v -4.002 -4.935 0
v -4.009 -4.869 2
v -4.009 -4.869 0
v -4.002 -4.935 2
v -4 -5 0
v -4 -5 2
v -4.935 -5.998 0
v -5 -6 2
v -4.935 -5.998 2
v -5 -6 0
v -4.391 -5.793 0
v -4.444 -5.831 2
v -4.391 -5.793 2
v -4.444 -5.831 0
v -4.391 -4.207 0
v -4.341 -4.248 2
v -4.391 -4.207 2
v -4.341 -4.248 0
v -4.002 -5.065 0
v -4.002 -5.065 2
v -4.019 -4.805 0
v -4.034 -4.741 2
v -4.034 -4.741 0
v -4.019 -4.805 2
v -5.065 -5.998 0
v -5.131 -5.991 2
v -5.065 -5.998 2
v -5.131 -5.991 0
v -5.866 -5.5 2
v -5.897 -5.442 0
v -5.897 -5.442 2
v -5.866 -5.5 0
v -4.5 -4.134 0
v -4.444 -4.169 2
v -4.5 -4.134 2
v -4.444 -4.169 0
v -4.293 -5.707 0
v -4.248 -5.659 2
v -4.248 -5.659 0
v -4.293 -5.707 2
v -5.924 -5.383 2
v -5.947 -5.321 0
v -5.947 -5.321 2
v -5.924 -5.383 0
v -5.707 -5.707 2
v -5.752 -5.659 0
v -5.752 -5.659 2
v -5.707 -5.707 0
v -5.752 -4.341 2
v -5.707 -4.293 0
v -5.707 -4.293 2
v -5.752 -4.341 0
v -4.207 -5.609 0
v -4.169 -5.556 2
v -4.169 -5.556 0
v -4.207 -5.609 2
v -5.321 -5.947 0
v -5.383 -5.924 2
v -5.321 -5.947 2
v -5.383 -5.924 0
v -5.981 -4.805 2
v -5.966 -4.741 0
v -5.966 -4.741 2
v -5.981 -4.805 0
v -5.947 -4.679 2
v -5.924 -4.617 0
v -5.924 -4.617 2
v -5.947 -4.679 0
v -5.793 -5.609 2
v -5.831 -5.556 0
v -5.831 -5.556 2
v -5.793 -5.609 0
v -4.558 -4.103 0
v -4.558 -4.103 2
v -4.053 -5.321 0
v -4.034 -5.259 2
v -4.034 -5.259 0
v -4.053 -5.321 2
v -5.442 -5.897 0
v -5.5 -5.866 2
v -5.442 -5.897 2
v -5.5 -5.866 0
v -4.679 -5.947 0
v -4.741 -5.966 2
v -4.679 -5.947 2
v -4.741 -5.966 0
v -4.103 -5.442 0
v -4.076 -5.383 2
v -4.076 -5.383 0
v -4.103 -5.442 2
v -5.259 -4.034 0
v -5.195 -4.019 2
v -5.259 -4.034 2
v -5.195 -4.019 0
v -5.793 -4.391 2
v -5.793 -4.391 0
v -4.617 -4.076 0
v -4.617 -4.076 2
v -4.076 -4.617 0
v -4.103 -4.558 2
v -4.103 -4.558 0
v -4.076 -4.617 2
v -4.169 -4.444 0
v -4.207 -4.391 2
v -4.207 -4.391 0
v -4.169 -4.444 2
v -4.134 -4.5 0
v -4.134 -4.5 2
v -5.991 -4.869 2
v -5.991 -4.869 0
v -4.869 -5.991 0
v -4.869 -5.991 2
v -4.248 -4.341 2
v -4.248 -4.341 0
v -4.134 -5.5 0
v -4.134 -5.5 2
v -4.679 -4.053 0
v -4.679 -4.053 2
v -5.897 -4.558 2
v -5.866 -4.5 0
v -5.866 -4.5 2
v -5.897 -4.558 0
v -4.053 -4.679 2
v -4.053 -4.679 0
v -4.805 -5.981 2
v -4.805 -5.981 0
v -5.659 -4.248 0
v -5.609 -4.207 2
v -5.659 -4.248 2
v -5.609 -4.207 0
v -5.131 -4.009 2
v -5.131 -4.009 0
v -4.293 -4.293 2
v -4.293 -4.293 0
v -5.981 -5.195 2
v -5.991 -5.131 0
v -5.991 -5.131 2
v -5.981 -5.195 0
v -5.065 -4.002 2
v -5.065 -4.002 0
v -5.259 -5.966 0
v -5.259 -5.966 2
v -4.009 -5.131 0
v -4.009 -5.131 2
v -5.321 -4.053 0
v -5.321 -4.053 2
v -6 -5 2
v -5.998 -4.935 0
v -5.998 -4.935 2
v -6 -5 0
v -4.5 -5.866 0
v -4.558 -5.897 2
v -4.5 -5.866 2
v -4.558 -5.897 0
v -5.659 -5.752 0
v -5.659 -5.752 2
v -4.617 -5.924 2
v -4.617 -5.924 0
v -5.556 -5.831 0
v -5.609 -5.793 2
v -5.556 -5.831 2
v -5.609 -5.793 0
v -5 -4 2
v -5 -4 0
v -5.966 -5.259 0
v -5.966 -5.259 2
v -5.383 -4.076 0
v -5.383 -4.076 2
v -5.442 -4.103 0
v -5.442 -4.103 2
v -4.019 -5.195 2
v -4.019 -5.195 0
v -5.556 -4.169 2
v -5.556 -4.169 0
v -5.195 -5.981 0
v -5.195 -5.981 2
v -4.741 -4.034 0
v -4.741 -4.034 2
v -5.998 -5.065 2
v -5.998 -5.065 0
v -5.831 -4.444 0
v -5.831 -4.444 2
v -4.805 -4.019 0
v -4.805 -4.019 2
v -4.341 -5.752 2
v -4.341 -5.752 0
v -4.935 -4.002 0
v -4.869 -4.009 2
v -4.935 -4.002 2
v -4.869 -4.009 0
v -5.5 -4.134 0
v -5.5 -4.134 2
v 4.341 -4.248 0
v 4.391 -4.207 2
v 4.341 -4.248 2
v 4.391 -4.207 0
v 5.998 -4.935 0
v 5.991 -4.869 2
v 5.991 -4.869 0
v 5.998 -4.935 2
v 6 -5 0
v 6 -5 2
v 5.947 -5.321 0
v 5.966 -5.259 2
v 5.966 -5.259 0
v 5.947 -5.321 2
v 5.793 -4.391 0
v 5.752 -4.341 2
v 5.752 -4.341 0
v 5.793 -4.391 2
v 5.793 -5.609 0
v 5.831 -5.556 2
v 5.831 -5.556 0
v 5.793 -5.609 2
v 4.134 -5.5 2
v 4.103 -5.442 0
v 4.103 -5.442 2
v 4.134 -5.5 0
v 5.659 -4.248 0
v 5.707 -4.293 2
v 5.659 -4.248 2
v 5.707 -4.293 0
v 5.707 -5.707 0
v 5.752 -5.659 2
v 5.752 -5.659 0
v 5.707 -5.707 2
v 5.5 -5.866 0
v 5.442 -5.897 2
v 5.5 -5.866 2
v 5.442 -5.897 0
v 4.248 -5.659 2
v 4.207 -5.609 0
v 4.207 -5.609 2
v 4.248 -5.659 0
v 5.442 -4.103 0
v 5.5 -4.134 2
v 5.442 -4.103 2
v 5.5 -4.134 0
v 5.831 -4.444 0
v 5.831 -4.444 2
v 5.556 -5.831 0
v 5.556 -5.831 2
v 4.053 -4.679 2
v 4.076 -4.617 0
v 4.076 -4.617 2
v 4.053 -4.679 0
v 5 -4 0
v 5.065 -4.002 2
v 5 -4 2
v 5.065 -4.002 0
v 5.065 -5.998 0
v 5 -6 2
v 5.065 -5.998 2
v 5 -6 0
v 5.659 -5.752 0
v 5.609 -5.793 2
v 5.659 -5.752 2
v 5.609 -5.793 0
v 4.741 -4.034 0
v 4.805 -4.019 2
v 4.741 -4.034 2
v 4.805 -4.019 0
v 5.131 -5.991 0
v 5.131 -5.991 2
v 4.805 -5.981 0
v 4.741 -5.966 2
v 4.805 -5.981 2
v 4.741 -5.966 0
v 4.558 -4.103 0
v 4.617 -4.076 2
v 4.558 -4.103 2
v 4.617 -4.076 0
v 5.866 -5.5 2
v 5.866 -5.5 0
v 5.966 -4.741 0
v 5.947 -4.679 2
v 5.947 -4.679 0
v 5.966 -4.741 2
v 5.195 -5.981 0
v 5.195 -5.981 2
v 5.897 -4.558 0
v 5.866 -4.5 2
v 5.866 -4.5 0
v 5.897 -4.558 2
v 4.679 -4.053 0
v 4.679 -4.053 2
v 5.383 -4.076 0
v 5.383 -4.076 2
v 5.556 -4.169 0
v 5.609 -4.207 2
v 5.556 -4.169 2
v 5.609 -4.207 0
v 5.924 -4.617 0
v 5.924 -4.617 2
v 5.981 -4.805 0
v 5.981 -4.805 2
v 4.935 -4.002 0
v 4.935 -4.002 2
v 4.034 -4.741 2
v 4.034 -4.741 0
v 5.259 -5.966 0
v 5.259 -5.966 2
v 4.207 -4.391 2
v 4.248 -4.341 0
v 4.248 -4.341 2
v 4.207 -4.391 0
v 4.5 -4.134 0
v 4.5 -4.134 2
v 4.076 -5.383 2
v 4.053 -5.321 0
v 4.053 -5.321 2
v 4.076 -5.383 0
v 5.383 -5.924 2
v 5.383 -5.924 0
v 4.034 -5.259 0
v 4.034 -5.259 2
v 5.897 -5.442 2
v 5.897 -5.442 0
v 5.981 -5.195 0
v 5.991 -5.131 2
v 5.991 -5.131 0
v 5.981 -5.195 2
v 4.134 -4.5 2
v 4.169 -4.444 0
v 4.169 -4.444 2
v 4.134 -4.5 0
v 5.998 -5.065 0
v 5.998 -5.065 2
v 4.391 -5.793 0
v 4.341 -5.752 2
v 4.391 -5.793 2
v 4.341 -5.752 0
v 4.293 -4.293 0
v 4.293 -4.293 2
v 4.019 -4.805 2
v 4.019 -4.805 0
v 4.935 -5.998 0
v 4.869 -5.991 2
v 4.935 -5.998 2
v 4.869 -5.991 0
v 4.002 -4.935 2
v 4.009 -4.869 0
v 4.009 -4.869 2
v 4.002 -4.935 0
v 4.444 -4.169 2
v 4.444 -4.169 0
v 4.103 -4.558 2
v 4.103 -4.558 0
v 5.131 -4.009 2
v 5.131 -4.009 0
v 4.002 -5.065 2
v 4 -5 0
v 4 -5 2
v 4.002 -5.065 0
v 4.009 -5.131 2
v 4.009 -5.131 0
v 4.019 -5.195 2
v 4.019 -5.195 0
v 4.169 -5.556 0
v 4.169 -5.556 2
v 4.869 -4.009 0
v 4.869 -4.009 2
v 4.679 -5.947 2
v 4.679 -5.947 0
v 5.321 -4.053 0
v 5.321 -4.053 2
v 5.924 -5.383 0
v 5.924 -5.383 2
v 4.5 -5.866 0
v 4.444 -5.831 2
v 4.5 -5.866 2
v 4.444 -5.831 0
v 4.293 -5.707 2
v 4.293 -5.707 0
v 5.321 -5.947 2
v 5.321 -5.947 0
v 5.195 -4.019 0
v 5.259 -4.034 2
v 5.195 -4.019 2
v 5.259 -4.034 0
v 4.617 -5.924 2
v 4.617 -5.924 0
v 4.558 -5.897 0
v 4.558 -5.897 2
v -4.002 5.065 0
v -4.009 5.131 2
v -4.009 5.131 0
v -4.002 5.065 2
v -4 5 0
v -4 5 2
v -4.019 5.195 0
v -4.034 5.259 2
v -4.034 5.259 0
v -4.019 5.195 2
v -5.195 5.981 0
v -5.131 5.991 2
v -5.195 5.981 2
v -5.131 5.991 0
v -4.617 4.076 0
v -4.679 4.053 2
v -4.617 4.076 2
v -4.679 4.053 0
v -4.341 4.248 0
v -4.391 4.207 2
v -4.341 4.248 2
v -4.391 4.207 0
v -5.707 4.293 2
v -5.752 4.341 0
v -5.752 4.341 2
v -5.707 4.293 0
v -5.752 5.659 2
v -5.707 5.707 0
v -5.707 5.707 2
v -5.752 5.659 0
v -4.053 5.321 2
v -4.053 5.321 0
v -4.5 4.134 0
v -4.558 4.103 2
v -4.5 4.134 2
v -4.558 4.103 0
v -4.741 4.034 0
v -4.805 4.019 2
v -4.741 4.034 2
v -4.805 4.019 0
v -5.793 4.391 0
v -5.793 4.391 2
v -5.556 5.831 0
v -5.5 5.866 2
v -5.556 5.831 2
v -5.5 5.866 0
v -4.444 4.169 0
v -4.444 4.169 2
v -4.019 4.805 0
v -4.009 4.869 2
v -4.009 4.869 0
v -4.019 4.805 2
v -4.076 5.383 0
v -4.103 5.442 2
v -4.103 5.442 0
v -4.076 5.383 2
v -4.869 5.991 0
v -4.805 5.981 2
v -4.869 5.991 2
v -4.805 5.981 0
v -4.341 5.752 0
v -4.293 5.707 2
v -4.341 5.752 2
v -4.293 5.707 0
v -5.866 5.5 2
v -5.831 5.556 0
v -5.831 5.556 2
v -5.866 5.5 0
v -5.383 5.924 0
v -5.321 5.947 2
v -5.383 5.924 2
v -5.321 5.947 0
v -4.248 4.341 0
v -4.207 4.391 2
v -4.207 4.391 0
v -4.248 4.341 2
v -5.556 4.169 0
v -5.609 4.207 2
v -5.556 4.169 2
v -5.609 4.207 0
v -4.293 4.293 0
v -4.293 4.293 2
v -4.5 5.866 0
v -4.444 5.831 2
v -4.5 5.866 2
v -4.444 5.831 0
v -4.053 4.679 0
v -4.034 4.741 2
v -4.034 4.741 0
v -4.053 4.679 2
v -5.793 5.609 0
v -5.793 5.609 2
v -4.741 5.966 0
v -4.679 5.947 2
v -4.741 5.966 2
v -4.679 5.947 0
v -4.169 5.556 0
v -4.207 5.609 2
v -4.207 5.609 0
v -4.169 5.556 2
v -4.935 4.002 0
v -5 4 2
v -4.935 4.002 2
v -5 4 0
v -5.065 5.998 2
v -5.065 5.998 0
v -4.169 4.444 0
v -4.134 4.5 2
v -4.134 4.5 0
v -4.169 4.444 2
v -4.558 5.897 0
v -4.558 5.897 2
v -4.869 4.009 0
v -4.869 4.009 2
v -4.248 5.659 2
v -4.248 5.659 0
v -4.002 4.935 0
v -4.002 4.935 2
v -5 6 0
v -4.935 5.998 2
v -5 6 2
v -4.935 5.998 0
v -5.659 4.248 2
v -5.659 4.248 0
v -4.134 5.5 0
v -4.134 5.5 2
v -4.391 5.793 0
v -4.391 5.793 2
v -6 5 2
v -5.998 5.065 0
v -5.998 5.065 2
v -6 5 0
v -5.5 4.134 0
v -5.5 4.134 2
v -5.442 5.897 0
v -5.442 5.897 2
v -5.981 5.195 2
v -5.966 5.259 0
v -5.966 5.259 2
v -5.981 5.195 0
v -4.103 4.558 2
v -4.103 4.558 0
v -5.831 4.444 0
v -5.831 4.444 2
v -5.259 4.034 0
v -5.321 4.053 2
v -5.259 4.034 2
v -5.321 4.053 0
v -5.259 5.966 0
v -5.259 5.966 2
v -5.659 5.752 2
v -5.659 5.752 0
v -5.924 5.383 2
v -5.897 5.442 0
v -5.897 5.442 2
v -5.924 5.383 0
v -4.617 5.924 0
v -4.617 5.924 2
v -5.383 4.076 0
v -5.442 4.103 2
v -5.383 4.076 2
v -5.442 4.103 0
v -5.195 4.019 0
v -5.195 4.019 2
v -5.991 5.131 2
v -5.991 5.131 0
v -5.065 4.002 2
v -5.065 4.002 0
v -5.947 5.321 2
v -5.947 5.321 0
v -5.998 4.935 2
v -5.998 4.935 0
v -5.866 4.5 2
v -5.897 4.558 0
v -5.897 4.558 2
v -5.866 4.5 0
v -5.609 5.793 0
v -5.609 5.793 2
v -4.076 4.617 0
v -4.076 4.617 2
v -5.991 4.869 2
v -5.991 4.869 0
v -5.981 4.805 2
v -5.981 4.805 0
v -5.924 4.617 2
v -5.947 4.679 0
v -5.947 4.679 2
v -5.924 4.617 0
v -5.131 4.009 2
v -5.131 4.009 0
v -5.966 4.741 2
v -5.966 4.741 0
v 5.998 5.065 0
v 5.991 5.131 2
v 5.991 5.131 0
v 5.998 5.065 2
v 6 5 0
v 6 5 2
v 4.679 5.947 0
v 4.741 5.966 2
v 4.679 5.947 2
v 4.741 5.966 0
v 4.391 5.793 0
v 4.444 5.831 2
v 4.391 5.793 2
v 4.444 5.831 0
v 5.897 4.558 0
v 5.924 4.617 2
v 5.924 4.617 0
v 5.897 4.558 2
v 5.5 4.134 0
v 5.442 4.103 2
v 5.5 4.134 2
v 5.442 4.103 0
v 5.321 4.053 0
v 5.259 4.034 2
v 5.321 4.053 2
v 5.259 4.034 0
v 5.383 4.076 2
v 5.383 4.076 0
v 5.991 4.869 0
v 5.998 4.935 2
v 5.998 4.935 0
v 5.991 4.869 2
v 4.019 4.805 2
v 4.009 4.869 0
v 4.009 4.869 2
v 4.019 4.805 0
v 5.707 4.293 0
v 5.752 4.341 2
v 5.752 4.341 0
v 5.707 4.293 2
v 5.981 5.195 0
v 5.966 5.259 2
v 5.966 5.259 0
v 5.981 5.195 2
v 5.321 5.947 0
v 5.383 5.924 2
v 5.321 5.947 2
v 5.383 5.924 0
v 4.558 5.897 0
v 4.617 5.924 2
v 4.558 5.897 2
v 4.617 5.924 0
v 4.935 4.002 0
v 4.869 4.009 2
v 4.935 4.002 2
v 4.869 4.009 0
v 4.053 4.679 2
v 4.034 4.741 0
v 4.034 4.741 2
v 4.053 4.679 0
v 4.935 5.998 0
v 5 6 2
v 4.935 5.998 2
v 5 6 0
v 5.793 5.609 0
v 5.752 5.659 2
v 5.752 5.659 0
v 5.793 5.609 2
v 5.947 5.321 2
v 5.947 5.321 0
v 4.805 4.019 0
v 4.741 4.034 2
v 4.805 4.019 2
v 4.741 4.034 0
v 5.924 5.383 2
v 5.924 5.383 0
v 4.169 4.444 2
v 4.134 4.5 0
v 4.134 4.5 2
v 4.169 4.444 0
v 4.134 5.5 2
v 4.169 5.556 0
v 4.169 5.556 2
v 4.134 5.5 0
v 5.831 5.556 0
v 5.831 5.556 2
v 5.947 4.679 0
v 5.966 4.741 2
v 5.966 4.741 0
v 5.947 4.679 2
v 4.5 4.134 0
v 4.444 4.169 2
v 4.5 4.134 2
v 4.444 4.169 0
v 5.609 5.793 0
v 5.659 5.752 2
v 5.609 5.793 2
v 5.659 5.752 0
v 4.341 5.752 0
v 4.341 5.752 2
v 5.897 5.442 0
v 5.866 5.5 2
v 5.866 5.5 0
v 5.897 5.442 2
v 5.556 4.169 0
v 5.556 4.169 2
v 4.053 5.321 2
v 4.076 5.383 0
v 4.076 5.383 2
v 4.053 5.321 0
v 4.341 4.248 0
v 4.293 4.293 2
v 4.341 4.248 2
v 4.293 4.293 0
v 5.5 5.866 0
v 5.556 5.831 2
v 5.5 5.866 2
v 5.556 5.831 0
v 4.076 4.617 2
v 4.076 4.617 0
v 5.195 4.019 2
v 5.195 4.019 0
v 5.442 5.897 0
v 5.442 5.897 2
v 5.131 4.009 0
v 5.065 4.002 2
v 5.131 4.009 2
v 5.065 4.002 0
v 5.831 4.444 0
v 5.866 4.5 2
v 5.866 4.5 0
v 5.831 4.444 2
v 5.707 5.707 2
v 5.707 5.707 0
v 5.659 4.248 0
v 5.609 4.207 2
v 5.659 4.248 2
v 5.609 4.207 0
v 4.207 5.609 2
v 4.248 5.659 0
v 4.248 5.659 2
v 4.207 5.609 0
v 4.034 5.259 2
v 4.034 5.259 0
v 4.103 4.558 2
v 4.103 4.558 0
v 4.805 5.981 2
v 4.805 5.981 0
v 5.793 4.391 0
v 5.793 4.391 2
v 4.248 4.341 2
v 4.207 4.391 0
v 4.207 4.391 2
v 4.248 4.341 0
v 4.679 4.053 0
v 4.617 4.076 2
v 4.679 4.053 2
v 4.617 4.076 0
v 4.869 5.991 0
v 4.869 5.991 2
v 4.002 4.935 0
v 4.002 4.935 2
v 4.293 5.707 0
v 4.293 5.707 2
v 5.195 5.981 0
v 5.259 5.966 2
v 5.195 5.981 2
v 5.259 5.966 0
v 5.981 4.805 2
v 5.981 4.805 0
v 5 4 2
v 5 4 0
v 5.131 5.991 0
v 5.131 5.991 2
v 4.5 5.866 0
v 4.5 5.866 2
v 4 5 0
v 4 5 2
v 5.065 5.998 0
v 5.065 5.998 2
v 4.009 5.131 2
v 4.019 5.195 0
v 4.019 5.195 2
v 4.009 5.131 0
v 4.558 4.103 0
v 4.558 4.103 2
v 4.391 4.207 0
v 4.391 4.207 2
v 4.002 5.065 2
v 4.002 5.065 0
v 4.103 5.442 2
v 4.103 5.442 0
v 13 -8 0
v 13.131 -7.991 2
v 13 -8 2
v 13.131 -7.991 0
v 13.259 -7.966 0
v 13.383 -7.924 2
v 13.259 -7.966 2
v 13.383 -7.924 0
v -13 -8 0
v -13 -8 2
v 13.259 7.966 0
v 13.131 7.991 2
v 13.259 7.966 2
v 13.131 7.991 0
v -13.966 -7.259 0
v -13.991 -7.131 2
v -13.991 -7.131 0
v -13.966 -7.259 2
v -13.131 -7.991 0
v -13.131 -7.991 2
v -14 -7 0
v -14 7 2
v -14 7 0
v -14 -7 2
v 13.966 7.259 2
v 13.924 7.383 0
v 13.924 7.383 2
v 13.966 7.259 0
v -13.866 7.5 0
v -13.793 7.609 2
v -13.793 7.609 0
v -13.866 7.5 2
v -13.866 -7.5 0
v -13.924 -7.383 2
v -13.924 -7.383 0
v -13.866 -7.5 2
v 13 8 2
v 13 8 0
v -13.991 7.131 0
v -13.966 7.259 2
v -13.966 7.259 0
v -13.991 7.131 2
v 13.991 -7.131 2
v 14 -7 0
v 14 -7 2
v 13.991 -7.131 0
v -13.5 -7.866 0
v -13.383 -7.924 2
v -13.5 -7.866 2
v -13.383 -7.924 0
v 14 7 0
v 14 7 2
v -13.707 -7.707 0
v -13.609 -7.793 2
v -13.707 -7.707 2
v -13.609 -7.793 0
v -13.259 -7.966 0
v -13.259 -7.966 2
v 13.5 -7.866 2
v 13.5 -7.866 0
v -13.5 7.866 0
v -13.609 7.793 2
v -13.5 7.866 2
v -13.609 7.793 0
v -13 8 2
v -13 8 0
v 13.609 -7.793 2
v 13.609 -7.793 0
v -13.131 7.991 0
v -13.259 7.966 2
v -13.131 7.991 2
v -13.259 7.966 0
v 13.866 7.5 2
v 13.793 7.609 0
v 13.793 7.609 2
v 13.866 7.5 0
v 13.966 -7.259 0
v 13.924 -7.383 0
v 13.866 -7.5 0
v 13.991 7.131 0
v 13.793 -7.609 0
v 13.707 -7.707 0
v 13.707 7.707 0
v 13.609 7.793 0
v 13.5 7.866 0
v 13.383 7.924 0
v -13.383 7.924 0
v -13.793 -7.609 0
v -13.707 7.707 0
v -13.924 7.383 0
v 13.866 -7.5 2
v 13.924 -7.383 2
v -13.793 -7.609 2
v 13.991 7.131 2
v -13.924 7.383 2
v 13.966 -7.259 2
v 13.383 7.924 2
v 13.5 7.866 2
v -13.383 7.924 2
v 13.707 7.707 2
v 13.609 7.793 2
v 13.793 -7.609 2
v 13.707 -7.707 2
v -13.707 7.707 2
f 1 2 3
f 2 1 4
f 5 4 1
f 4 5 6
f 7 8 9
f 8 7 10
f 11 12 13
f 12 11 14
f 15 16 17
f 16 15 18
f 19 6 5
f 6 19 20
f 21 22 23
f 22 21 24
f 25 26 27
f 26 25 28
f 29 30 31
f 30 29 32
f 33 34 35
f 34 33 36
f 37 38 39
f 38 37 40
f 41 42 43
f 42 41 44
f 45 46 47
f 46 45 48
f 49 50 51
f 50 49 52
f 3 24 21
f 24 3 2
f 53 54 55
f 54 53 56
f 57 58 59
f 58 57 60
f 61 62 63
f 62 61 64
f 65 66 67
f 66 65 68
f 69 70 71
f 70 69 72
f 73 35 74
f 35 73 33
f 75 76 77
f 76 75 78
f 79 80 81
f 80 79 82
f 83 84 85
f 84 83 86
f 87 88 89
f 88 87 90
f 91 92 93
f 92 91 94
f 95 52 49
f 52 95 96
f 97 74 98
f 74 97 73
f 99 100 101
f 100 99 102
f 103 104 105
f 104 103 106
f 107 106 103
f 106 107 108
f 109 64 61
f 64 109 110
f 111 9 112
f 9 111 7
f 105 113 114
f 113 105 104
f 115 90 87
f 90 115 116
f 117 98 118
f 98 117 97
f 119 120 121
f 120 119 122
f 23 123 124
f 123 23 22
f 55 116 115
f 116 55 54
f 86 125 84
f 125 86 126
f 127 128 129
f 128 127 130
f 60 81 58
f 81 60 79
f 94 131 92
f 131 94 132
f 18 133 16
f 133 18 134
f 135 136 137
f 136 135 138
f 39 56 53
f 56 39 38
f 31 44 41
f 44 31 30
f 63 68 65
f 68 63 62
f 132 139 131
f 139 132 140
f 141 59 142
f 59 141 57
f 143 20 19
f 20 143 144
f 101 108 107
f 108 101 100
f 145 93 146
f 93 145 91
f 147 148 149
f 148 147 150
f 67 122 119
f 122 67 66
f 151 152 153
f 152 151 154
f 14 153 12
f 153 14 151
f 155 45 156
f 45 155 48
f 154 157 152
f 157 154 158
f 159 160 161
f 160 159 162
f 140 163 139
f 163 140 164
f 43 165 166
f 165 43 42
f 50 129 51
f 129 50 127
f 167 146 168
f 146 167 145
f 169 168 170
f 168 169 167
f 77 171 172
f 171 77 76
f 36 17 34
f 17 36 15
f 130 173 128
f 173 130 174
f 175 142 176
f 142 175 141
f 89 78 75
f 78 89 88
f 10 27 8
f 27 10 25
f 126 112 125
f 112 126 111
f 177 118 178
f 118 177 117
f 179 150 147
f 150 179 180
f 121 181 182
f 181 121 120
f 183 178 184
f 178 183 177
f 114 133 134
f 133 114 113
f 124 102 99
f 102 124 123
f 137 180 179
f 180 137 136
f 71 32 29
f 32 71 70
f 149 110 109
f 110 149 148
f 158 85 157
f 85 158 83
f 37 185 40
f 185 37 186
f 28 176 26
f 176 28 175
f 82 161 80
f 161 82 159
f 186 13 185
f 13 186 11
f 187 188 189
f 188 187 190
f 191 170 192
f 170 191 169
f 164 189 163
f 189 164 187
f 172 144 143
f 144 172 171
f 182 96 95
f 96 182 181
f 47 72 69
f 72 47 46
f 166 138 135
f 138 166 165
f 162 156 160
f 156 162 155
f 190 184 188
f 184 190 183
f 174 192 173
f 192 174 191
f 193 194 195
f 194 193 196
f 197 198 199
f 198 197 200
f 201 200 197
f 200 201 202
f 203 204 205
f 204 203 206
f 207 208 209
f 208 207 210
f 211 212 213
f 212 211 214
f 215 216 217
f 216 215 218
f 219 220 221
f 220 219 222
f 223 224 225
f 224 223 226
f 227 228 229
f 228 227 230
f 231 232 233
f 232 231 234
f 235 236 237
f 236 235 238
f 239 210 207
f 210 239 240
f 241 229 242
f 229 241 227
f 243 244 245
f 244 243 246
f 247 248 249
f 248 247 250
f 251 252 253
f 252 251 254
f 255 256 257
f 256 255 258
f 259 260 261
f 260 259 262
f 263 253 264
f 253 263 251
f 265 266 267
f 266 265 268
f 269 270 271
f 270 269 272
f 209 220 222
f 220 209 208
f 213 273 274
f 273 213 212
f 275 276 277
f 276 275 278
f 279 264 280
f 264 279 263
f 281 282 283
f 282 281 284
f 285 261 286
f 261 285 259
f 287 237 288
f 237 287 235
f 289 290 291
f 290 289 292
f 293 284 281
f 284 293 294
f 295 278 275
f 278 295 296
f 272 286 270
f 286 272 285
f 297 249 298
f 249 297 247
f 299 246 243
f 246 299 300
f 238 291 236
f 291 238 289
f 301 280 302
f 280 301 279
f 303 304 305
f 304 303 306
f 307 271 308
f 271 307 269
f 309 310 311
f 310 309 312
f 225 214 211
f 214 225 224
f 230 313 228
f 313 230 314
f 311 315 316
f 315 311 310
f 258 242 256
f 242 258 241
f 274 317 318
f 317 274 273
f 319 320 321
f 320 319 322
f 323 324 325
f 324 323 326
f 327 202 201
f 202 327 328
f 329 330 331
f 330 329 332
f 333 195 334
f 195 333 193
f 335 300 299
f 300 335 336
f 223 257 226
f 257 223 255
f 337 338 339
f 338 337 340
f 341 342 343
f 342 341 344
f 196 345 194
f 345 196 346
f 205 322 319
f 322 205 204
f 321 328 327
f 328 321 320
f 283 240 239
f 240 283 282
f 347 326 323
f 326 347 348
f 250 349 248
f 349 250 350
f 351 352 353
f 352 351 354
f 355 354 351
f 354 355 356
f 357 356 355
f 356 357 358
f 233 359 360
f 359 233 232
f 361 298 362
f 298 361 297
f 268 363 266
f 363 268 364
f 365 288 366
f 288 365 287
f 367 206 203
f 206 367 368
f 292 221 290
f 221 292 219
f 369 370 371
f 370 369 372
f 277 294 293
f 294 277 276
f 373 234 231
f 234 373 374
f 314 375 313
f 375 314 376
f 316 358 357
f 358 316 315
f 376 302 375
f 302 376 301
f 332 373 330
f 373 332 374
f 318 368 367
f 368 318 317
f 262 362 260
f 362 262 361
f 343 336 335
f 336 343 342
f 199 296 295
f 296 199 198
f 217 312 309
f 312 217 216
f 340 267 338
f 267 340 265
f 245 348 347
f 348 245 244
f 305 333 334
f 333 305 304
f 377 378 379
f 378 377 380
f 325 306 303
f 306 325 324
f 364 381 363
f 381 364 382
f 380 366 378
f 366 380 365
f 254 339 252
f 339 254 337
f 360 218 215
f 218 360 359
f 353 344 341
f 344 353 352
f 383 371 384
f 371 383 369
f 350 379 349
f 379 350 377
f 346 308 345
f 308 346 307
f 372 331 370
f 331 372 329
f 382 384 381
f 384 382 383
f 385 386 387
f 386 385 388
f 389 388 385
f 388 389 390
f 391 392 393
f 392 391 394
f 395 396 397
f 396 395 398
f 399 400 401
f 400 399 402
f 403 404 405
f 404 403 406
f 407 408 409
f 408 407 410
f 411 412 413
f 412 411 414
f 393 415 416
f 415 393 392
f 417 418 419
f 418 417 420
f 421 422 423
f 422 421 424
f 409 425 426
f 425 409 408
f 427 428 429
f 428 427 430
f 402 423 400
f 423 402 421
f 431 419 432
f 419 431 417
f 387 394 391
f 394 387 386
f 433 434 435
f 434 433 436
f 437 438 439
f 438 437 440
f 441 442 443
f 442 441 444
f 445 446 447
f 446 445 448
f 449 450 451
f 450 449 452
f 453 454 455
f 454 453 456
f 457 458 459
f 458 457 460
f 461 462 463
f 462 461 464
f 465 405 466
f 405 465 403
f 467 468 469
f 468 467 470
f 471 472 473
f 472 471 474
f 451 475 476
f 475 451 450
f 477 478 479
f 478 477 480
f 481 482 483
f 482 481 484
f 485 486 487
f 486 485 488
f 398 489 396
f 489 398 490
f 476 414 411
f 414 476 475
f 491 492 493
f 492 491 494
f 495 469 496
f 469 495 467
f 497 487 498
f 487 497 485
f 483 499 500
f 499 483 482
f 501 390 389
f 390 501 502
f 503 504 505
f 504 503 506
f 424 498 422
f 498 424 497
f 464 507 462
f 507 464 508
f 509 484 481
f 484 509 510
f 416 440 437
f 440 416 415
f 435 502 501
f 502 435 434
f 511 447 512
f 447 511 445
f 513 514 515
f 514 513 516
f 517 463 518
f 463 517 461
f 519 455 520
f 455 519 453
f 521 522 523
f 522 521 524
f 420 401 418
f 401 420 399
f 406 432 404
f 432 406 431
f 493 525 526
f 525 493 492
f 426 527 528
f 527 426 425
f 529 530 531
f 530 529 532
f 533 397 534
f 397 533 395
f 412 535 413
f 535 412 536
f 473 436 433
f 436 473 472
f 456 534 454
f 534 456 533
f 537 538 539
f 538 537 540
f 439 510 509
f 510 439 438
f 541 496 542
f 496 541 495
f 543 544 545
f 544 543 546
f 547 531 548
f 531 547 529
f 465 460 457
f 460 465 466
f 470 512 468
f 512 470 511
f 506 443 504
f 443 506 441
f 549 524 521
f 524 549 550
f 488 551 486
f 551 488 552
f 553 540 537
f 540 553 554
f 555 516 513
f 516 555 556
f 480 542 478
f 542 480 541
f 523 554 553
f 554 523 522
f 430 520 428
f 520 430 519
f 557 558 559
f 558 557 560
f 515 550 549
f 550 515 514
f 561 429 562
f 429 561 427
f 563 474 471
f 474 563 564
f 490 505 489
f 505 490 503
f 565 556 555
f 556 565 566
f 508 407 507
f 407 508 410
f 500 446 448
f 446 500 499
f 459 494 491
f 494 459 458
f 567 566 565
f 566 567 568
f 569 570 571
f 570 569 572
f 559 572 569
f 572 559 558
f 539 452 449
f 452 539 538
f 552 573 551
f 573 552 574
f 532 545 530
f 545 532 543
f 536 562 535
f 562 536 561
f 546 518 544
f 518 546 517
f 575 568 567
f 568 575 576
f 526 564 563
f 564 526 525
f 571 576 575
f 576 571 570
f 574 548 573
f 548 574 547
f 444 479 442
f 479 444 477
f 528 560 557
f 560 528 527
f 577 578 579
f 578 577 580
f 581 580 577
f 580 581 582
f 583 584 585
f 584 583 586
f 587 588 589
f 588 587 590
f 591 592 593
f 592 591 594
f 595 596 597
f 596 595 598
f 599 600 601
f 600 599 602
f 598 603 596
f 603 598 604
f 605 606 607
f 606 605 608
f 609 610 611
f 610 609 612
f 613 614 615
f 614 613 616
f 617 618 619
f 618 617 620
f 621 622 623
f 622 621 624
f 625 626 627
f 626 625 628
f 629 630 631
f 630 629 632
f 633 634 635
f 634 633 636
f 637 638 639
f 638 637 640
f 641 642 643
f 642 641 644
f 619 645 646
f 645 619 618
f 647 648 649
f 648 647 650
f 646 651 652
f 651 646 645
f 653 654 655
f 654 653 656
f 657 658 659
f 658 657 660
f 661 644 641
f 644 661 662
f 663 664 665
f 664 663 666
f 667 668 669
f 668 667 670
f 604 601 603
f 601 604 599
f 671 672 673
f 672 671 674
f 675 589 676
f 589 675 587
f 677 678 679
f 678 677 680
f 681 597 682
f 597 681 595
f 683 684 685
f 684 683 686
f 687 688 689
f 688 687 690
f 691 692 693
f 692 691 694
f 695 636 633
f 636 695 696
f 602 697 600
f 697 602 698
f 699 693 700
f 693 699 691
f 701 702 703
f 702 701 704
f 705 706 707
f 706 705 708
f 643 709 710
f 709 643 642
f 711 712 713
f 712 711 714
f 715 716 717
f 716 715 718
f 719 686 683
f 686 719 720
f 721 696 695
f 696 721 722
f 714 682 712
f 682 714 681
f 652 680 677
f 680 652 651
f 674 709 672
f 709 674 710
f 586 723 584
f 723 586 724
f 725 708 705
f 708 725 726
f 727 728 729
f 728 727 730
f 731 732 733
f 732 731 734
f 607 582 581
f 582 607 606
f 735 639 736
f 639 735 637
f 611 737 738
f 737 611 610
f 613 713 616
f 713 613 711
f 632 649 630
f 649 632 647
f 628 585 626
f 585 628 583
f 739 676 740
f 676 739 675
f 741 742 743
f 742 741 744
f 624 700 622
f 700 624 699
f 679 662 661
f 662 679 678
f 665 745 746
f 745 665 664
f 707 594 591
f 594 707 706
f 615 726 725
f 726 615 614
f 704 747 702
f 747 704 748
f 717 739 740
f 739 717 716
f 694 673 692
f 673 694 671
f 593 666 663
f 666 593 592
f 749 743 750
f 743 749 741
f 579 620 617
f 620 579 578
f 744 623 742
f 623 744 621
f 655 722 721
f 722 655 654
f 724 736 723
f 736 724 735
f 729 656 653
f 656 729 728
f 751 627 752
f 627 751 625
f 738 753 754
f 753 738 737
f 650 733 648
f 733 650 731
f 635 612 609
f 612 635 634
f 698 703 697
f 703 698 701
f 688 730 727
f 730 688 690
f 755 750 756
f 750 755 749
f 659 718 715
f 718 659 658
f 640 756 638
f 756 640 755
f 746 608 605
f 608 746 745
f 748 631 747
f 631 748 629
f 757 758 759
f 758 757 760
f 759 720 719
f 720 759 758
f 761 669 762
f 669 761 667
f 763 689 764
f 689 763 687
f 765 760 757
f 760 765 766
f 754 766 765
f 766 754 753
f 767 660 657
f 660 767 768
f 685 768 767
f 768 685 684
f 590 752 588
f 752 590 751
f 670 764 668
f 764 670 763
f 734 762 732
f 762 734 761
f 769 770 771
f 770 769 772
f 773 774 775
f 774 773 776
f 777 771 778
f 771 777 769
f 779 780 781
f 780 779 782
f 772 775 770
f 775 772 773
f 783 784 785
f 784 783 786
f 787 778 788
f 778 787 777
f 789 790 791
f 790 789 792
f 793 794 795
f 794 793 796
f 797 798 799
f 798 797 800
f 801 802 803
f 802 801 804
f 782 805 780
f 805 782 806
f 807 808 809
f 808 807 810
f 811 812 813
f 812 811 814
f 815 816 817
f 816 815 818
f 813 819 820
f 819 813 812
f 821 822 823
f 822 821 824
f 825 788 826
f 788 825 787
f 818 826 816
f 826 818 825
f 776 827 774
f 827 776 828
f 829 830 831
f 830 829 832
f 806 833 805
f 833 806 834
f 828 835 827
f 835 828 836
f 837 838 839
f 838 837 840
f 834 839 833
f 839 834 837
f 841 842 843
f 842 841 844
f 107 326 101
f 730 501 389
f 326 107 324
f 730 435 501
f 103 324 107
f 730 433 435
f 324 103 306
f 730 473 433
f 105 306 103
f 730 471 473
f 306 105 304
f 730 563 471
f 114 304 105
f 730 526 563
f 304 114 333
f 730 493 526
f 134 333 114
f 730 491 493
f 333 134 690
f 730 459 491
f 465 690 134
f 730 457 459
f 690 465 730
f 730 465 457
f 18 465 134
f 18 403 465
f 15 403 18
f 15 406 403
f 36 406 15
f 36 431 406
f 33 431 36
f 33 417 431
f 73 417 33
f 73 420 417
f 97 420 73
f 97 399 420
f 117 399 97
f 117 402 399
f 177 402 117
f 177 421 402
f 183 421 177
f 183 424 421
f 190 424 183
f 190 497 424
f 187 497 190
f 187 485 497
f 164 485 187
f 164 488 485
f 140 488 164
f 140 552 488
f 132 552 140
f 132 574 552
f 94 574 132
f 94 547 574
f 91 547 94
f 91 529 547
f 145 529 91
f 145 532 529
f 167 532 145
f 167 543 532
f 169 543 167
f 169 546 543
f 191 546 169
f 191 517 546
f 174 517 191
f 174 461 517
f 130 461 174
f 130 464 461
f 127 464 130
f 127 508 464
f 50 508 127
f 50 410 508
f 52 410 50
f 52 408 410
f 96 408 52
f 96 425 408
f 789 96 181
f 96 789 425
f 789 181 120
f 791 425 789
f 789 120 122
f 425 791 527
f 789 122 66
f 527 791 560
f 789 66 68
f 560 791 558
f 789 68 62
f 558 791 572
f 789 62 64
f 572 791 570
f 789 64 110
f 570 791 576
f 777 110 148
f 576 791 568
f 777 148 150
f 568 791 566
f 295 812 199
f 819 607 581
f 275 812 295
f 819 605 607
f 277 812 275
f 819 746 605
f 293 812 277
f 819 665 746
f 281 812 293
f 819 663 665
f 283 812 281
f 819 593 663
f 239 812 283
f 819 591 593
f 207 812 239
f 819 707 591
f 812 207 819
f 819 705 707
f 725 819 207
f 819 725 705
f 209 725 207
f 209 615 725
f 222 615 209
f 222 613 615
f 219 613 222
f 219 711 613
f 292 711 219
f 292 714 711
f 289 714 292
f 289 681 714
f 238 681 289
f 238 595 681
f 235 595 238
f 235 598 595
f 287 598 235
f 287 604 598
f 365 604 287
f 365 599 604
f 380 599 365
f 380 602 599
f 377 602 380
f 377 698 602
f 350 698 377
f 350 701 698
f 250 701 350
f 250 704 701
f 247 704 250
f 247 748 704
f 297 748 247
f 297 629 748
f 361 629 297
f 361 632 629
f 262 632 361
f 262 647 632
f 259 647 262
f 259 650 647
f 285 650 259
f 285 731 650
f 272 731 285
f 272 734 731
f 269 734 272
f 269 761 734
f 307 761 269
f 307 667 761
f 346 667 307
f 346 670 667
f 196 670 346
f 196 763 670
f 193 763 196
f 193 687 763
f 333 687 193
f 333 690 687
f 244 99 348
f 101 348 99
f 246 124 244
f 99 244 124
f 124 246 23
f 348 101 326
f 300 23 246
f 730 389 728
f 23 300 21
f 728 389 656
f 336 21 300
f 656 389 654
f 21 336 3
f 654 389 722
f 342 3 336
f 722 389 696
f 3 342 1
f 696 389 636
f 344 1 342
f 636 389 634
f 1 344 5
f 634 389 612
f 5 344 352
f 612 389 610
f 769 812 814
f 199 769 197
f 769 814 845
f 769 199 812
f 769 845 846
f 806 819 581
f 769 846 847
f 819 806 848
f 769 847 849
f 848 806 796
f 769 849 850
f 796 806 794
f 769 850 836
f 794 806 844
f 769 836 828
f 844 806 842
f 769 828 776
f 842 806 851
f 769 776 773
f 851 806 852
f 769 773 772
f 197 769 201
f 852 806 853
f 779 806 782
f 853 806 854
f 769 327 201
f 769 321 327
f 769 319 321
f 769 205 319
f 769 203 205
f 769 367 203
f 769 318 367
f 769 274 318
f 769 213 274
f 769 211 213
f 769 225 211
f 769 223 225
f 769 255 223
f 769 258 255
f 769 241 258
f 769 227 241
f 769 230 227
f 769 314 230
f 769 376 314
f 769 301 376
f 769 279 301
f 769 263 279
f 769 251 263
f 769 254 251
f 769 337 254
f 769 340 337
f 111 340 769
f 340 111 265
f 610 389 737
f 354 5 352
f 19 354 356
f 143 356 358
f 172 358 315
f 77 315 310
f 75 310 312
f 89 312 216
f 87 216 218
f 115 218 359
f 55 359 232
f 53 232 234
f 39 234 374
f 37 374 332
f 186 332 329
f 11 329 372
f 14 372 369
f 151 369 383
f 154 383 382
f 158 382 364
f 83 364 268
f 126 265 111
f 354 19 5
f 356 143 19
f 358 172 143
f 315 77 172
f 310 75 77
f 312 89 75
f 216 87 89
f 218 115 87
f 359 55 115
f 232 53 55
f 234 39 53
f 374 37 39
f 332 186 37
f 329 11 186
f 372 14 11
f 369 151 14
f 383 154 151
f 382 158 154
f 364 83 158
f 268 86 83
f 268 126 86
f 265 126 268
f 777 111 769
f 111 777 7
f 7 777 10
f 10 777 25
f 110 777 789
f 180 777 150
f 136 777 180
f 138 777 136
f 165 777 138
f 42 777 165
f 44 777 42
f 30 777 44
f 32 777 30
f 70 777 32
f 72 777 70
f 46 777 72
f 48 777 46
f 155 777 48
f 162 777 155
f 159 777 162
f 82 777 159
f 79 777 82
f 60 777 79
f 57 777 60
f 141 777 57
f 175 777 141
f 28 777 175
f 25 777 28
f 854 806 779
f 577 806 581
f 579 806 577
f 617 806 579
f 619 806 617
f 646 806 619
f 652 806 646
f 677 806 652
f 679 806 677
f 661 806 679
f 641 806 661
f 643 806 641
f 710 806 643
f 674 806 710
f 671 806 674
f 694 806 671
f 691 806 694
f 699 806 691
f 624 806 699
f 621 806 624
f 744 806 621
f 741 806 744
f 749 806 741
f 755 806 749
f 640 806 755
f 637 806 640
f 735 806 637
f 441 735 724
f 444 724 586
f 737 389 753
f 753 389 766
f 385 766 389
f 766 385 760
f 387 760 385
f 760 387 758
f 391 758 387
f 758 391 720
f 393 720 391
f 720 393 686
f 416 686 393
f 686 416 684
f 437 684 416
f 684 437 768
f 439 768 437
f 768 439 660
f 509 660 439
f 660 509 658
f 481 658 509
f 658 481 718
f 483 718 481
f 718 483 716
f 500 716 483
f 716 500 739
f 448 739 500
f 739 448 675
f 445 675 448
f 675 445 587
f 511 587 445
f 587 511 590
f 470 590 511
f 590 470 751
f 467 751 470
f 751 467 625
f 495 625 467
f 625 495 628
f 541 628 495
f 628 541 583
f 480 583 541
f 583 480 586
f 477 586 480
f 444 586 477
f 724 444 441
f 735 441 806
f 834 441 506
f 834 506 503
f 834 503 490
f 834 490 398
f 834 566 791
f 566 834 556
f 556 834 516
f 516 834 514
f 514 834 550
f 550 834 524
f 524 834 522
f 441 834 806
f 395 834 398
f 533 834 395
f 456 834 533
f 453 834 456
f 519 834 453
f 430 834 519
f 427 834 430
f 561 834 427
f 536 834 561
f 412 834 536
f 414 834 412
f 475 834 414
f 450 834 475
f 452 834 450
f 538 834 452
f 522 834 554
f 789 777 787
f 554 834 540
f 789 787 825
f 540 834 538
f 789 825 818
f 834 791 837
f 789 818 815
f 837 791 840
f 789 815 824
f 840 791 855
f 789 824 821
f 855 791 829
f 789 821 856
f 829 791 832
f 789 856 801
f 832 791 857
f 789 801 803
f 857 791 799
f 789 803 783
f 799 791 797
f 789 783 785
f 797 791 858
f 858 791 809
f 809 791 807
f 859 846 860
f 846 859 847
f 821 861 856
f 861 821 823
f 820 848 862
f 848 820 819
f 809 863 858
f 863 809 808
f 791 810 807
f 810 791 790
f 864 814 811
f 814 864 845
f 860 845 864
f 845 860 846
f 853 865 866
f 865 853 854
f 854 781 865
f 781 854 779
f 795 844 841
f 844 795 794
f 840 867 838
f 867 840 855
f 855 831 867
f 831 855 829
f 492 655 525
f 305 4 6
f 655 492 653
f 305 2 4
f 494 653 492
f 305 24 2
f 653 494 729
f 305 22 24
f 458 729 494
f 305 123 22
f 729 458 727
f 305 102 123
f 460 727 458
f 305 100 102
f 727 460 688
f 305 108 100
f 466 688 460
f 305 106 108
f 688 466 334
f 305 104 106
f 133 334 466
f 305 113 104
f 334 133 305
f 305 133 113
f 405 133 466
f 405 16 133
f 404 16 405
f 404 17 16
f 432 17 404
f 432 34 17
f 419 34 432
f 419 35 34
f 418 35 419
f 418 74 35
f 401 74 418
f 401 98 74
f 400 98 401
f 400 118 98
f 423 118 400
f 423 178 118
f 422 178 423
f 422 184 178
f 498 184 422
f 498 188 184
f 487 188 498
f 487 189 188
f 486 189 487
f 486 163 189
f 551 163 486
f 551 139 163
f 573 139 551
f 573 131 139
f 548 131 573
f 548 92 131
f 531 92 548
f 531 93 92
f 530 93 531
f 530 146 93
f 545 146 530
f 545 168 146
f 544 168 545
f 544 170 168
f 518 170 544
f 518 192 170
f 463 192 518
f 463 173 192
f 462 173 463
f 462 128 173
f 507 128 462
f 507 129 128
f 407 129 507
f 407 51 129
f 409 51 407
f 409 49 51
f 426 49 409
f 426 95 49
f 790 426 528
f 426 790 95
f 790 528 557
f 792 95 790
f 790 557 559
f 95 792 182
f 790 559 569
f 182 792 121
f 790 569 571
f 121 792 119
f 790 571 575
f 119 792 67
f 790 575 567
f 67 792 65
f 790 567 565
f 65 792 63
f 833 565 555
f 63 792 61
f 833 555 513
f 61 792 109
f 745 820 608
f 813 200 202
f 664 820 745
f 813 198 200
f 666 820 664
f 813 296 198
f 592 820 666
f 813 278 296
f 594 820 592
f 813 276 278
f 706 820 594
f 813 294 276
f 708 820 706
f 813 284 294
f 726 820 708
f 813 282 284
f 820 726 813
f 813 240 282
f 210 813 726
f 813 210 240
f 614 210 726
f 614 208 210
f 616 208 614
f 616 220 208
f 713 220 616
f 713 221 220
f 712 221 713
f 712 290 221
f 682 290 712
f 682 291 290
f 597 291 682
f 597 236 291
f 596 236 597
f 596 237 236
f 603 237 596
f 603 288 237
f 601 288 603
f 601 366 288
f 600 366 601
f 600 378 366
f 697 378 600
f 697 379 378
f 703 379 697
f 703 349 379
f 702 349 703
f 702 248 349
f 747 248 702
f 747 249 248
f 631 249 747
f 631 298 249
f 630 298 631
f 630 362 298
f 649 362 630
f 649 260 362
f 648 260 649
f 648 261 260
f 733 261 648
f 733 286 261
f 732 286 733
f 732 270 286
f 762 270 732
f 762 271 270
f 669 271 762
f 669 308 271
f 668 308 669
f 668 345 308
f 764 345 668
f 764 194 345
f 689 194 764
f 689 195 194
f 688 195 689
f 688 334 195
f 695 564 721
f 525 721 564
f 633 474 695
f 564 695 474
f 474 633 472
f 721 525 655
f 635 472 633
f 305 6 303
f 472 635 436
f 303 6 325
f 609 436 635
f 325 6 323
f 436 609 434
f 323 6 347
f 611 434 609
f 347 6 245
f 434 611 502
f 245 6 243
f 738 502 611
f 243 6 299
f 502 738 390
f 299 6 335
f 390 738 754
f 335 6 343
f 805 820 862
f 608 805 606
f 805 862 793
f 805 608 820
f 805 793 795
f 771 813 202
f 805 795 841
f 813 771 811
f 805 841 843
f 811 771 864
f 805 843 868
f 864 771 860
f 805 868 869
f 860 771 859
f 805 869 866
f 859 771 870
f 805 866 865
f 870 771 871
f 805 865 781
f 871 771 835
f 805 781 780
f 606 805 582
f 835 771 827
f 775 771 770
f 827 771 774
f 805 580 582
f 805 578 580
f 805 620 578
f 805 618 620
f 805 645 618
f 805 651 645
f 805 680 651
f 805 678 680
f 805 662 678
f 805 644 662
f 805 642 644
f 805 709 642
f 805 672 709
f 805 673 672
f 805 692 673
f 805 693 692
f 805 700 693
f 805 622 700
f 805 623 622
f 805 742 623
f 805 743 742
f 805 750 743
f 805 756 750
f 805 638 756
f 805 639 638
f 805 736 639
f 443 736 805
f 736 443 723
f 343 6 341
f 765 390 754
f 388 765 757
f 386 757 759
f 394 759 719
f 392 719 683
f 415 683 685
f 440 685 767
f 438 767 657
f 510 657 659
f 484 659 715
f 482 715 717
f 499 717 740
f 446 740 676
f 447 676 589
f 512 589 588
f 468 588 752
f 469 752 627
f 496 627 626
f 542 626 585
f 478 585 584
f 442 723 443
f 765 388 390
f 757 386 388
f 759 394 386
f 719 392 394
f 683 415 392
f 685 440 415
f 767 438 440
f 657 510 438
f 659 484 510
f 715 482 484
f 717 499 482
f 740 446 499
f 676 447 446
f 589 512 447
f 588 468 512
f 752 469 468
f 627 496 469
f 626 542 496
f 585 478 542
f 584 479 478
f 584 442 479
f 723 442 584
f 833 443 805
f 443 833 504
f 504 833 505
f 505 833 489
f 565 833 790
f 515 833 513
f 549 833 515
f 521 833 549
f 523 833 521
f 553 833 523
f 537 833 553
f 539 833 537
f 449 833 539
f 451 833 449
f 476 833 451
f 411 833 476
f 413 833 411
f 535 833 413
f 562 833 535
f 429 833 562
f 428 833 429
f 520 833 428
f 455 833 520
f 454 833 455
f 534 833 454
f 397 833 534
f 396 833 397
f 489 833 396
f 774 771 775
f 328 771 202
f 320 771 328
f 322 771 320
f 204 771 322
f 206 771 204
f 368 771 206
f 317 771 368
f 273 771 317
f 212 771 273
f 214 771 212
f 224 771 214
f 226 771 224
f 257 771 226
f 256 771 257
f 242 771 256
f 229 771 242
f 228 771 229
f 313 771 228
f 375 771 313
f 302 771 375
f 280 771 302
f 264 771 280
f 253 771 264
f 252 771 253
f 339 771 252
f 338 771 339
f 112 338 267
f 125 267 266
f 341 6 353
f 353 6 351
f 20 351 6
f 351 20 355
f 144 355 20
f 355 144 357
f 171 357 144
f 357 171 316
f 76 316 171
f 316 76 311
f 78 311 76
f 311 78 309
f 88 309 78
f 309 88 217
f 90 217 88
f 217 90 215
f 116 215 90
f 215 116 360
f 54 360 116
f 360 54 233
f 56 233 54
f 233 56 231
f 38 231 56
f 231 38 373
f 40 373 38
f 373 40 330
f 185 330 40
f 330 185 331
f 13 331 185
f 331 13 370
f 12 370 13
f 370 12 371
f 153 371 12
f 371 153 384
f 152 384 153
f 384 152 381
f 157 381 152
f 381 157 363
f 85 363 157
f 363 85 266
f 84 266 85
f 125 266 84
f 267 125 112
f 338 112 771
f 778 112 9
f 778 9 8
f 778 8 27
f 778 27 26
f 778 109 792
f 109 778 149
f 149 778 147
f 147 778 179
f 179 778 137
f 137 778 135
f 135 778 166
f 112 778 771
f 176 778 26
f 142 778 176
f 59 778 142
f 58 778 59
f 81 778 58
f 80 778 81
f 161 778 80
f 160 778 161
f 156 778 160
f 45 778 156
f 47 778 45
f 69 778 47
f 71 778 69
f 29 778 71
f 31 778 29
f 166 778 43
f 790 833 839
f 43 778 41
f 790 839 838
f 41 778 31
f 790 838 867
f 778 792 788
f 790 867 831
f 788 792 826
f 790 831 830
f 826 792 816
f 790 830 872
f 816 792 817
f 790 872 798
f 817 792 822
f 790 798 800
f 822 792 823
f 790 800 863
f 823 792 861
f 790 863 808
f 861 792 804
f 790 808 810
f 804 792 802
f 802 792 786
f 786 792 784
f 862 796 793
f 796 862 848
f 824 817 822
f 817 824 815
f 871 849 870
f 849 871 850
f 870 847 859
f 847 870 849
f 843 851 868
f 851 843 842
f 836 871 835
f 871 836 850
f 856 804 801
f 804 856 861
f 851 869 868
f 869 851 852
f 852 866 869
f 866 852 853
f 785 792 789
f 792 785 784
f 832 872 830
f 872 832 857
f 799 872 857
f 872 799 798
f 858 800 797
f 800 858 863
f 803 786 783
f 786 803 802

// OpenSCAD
// Auto-generated from tests/data/feature_fixtures_manifest.json
// fixture: plate_filleted_grid_holes
// fixture_type: plate
// description: Filleted-edge plate with a 2x2 hole grid. Combines edge fillet with grid detection.
$fn = 96;

plate_size = [28.000000, 16.000000, 2.000000];
plate_origin = [-14.000000, -8.000000, 0.000000];

module through_hole(center, diameter, height) {
  translate(center) cylinder(d=diameter, h=height, center=false);
}

module through_slot(start, end, width, height) {
  hull() {
    through_hole(start, width, height);
    through_hole(end, width, height);
  }
}

module counterbore_hole(center, through_d, bore_d, bore_depth, plate_thickness) {
  translate([center[0], center[1], -0.1])
    cylinder(d=through_d, h=plate_thickness + 0.2, center=false);
  translate([center[0], center[1], plate_thickness - bore_depth])
    cylinder(d=bore_d, h=bore_depth + 0.1, center=false);
}

plate_edge_radius = 1.000000;
plate_inner_square = [26.000000, 14.000000];

difference() {
  linear_extrude(height=plate_size[2]) offset(r=plate_edge_radius, $fn=48) square(plate_inner_square, center=true);
  for (row = [0 : 1]) {
    for (col = [0 : 1]) {
      through_hole([-5.000000, -5.000000, -0.100000] + row * [0.000000, 10.000000, 0.000000] + col * [10.000000, 0.000000, 0.000000], 2.000000, 2.200000);  // grid_pattern_0
    }
  }
}
